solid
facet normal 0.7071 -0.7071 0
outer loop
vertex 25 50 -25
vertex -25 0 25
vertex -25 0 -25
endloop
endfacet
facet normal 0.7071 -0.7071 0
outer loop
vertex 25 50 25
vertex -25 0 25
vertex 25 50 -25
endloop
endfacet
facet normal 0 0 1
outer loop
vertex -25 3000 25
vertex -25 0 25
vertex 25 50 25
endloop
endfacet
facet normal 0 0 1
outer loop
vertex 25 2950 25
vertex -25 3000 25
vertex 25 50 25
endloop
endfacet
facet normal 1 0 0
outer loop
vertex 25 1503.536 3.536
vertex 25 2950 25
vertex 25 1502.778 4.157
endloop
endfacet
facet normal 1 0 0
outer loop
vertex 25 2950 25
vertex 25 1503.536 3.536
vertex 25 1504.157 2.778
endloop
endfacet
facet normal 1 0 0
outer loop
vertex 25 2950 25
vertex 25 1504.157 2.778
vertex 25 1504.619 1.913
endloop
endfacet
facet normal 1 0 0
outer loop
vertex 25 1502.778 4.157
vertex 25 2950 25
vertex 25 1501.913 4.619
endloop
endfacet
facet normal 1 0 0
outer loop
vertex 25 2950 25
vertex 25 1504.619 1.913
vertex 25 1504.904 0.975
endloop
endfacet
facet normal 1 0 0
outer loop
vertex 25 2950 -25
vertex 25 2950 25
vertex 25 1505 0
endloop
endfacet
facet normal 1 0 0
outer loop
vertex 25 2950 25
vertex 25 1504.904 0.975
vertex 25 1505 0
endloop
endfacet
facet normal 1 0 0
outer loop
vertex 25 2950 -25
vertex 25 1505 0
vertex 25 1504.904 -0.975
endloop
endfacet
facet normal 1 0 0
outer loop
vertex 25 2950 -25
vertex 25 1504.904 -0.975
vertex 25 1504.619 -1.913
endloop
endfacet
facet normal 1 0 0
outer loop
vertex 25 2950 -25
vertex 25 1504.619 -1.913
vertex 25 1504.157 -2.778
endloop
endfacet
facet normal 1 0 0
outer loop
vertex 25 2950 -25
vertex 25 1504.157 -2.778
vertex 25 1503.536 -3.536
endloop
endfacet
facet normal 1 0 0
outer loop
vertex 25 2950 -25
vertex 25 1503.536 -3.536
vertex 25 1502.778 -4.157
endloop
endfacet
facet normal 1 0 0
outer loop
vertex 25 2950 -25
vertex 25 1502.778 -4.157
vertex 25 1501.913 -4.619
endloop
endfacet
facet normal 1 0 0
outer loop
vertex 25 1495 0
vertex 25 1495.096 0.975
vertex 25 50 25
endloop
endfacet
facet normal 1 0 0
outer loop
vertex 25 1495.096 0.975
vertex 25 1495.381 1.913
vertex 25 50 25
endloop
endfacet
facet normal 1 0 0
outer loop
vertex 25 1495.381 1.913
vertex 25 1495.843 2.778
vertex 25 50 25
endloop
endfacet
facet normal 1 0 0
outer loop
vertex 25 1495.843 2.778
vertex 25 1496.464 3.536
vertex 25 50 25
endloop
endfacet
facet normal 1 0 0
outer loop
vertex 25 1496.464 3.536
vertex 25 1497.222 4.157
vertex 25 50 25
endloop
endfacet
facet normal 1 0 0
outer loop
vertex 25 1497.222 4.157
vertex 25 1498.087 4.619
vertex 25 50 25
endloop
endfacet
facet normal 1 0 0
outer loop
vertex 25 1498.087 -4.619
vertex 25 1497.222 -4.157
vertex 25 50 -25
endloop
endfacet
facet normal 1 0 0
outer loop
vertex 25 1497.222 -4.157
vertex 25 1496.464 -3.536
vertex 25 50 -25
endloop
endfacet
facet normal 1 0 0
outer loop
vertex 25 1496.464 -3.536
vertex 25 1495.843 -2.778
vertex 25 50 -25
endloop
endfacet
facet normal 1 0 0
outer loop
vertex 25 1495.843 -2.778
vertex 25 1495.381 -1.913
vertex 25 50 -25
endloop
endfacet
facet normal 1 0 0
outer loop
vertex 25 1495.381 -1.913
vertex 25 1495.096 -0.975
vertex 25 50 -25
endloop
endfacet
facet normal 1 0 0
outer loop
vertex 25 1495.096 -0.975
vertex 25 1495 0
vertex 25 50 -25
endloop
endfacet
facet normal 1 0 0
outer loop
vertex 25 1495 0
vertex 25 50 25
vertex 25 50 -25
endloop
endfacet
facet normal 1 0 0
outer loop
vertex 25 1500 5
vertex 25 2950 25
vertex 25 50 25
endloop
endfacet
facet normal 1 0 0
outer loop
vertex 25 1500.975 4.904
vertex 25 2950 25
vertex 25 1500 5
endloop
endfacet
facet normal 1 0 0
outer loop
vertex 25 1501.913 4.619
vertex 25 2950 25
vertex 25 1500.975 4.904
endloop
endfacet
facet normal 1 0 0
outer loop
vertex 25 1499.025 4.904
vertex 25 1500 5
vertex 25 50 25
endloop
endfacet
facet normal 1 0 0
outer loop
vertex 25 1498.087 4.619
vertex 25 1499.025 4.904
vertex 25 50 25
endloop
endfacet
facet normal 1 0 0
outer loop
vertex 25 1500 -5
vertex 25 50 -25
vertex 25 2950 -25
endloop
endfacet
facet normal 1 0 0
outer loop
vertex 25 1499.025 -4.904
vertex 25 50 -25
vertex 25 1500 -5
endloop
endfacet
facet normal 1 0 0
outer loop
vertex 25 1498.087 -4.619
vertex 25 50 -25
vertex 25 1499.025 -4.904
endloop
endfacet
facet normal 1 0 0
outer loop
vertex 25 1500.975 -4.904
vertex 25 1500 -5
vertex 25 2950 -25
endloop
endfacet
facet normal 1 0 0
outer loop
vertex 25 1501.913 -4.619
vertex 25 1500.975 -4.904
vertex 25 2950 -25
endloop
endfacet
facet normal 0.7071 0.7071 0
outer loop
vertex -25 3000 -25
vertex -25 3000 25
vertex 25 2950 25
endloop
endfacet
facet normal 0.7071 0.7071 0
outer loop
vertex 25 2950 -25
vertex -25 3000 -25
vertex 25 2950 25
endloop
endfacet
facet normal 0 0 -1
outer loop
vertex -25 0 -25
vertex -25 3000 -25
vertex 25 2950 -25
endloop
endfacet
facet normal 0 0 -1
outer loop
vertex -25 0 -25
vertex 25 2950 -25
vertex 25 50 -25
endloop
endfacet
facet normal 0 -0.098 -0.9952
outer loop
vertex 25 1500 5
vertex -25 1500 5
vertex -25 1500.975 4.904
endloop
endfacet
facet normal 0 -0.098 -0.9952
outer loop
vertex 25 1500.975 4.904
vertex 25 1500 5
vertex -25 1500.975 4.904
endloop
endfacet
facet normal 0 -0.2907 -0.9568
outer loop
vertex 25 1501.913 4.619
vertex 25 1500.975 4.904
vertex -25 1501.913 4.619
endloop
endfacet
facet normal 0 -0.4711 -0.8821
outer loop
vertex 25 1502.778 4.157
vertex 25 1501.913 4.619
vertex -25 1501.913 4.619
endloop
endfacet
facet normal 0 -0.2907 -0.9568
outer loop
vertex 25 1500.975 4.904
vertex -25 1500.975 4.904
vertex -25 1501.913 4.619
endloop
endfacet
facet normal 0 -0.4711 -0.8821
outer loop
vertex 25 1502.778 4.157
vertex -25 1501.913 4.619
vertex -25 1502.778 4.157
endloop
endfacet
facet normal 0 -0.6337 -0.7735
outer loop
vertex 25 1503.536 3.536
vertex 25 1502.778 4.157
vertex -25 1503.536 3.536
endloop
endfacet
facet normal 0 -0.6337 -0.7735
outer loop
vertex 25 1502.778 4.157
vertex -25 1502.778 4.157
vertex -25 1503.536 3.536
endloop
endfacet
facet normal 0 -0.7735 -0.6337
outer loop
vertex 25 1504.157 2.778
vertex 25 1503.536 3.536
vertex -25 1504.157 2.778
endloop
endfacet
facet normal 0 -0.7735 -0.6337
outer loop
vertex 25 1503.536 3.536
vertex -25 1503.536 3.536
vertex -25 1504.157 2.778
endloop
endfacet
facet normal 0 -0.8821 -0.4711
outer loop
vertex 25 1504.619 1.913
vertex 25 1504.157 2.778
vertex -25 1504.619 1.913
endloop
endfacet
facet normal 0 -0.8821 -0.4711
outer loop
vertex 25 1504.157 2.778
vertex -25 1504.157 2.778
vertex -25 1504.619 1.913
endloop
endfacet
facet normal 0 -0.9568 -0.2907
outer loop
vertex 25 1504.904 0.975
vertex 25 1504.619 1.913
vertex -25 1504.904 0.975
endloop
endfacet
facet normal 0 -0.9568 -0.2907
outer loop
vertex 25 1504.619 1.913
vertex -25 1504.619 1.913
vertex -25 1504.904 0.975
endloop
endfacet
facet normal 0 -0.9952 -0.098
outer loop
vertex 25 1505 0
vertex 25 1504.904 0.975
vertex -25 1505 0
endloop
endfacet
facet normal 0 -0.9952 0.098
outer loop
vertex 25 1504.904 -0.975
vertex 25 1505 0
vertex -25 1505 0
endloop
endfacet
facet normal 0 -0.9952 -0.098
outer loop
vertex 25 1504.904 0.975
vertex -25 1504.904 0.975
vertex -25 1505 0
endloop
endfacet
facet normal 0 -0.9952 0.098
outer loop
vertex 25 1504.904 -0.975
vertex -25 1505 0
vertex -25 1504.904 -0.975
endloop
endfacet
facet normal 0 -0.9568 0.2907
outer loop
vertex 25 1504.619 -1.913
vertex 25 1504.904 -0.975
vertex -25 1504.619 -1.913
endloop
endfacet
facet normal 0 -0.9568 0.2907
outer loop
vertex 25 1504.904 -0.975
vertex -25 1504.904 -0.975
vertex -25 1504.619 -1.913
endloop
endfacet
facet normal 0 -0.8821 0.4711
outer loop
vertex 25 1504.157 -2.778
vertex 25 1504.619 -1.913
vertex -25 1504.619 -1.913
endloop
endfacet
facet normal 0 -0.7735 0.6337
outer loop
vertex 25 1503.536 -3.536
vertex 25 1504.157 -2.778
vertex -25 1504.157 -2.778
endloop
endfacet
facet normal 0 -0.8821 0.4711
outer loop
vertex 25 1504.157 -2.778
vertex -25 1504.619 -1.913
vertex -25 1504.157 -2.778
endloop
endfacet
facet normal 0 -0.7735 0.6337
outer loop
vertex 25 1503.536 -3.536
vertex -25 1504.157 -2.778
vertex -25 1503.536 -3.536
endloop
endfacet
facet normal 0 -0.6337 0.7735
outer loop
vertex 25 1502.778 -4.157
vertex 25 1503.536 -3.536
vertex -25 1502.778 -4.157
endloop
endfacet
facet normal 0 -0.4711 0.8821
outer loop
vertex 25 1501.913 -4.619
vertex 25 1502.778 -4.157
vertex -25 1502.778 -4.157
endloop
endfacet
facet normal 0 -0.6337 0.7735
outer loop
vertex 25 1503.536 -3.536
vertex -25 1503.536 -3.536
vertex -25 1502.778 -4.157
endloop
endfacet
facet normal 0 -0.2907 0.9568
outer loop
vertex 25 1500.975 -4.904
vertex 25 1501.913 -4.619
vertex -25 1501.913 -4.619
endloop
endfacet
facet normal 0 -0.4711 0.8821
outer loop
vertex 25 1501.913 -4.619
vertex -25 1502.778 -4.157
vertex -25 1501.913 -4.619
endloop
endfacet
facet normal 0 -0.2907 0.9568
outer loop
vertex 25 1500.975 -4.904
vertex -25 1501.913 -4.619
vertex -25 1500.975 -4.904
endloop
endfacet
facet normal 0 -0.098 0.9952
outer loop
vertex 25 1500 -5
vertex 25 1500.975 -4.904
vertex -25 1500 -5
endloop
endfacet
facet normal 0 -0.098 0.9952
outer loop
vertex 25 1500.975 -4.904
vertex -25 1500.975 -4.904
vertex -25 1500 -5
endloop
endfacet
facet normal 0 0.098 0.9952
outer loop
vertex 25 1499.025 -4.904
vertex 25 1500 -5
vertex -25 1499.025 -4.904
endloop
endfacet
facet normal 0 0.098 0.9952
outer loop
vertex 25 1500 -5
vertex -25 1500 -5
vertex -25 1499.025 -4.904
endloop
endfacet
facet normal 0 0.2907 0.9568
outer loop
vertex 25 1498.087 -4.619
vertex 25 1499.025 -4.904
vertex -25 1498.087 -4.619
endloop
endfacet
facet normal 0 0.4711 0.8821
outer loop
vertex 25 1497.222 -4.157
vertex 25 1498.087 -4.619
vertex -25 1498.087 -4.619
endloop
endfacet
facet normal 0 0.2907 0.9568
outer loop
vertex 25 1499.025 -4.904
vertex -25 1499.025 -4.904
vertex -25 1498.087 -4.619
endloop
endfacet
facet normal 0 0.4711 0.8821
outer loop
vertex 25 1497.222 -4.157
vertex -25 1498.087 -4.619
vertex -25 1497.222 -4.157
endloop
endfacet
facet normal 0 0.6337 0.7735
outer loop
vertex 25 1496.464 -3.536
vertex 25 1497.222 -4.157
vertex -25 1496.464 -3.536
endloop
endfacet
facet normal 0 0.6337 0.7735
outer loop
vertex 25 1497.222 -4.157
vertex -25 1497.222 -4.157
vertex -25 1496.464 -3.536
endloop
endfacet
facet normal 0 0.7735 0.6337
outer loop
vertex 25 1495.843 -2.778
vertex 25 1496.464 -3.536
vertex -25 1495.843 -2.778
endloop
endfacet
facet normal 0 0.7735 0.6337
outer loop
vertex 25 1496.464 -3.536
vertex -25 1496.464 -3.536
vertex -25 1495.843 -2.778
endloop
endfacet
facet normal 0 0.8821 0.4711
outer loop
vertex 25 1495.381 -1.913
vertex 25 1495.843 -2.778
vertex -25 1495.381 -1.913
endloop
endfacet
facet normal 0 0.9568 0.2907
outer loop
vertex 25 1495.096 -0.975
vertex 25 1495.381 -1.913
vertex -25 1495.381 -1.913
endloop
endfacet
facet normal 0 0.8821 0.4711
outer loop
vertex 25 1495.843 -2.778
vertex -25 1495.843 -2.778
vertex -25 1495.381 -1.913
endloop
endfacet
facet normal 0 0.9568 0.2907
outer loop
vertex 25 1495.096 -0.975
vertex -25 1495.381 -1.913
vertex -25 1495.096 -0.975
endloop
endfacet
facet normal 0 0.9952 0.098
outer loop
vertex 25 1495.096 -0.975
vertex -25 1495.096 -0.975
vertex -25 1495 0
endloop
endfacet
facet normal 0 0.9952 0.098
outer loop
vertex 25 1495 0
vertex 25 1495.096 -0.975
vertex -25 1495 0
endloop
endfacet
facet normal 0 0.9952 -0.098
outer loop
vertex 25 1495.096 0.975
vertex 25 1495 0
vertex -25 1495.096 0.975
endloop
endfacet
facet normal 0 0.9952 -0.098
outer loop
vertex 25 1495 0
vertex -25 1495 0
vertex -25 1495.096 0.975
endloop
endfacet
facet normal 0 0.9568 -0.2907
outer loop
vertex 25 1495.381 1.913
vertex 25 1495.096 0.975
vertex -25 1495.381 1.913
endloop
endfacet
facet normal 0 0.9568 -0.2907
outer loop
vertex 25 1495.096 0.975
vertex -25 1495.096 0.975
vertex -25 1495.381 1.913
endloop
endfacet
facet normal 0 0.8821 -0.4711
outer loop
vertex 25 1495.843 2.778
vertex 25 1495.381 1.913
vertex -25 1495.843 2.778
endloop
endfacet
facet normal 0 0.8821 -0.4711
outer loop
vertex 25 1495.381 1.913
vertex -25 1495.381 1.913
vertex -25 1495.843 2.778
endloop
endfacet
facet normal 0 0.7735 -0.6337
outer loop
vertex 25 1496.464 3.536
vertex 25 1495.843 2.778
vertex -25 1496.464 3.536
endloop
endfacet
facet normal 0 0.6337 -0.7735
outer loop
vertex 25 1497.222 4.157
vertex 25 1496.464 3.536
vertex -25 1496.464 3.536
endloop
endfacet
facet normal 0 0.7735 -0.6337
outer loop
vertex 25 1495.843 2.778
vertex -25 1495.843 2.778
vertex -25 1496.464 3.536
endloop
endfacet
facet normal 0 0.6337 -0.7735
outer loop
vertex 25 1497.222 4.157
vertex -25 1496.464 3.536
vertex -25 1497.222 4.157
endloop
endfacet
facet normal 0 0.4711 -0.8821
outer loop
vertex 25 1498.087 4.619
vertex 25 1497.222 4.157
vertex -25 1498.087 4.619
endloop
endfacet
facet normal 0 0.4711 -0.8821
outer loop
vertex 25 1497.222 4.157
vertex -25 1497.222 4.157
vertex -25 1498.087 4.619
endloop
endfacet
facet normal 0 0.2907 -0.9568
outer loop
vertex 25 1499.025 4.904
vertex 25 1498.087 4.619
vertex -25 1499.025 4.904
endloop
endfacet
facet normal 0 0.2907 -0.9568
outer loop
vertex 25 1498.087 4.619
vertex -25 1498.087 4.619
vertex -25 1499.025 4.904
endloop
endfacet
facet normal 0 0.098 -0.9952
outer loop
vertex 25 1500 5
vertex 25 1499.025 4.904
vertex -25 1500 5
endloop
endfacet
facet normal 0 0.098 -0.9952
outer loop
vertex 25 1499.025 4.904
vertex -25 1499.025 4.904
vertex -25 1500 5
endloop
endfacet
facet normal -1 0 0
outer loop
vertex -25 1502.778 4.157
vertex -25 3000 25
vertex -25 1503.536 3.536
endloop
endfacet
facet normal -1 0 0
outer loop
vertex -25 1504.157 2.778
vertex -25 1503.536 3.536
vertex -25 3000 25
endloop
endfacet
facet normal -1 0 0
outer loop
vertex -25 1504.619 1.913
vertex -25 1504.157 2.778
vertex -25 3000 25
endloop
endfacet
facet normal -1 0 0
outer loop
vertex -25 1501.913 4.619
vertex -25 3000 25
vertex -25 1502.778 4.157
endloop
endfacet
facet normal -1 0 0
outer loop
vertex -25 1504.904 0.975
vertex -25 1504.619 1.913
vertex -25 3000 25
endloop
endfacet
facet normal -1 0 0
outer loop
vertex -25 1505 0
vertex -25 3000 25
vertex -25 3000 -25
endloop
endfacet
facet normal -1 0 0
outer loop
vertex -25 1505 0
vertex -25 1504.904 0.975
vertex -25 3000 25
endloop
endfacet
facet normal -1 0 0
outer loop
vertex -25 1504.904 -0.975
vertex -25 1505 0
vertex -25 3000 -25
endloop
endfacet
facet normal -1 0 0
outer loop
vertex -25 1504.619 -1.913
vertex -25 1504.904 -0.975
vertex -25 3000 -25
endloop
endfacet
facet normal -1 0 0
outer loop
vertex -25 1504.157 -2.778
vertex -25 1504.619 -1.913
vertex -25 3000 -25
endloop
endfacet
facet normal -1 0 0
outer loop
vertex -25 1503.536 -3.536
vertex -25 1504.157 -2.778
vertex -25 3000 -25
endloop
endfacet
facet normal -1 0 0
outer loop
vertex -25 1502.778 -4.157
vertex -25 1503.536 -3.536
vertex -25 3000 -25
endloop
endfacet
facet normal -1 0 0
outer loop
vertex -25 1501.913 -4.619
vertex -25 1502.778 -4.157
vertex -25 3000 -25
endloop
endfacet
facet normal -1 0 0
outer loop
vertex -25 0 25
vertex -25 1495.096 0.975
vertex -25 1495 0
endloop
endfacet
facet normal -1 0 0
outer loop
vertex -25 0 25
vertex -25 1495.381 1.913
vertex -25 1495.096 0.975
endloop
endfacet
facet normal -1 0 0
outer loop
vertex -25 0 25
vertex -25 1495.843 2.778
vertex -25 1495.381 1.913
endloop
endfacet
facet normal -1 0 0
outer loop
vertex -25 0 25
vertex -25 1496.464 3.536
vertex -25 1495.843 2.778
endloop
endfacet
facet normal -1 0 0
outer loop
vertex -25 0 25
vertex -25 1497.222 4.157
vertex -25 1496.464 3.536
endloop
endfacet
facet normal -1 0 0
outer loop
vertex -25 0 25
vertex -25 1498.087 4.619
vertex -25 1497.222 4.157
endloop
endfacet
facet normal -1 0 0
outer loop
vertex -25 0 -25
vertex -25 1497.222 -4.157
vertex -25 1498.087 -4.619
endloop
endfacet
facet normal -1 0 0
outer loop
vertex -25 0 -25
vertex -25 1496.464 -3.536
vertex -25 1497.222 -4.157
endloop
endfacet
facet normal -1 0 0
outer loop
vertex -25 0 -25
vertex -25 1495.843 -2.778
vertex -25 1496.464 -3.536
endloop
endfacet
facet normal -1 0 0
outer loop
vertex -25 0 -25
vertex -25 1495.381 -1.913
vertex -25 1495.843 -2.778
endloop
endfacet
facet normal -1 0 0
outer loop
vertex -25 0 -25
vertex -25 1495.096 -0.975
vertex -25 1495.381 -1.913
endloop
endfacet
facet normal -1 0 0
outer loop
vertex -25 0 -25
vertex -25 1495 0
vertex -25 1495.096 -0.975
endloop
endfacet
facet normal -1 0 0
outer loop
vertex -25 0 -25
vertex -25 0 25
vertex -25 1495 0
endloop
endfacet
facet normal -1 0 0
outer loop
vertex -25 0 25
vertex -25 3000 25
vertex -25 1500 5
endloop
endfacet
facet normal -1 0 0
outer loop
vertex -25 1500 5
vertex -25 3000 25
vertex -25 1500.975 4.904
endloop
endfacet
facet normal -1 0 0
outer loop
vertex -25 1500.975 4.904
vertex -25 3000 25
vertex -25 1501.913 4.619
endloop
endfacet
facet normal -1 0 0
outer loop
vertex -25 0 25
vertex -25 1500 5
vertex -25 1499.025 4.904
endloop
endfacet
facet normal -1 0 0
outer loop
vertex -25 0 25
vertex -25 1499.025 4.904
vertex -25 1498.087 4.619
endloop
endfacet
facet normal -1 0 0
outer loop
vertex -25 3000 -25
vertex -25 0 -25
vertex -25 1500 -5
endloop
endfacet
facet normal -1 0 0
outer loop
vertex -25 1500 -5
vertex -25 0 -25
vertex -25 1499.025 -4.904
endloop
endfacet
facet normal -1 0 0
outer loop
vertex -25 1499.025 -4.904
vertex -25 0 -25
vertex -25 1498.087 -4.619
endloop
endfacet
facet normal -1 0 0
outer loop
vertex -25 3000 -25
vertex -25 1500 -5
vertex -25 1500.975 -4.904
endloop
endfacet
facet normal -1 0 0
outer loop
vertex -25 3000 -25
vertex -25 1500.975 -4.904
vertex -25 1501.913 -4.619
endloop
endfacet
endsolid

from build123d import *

# Parameters (mm, degrees)
SKETCH_1_W          = 50
SKETCH_1_H          = 50
EXTRUDE_1_DEPTH     = 3000
CUT_EXTRUDE_1_DEPTH = 3000
SKETCH_4_R          = 5
CUT_EXTRUDE_2_DEPTH = 50


with BuildPart() as part:
    # Эскиз1 → Бобышка-Вытянуть1 (new body)
    with BuildSketch(Plane(origin=(0, 0, 0), x_dir=(1, 0, 0), z_dir=(0, 1, 0))):
        Rectangle(SKETCH_1_W, SKETCH_1_H)
    extrude(amount=EXTRUDE_1_DEPTH)

    # Эскиз2 → Вырез-Вытянуть1 (cut)
    with BuildSketch(Plane.XY.offset(25)):
        Polygon((25, 3000), (-25, 3000), (25, 2950), align=None)
        Polygon((25, 0), (-25, 0), (25, 50), align=None)
    extrude(amount=-CUT_EXTRUDE_1_DEPTH, mode=Mode.SUBTRACT)

    # Эскиз4 → Вырез-Вытянуть2 (cut)
    with BuildSketch(Plane.ZY.offset(25)):
        with Locations((0, 1500)):
            Circle(SKETCH_4_R)
    extrude(amount=-CUT_EXTRUDE_2_DEPTH, mode=Mode.SUBTRACT)


solid = part.part
